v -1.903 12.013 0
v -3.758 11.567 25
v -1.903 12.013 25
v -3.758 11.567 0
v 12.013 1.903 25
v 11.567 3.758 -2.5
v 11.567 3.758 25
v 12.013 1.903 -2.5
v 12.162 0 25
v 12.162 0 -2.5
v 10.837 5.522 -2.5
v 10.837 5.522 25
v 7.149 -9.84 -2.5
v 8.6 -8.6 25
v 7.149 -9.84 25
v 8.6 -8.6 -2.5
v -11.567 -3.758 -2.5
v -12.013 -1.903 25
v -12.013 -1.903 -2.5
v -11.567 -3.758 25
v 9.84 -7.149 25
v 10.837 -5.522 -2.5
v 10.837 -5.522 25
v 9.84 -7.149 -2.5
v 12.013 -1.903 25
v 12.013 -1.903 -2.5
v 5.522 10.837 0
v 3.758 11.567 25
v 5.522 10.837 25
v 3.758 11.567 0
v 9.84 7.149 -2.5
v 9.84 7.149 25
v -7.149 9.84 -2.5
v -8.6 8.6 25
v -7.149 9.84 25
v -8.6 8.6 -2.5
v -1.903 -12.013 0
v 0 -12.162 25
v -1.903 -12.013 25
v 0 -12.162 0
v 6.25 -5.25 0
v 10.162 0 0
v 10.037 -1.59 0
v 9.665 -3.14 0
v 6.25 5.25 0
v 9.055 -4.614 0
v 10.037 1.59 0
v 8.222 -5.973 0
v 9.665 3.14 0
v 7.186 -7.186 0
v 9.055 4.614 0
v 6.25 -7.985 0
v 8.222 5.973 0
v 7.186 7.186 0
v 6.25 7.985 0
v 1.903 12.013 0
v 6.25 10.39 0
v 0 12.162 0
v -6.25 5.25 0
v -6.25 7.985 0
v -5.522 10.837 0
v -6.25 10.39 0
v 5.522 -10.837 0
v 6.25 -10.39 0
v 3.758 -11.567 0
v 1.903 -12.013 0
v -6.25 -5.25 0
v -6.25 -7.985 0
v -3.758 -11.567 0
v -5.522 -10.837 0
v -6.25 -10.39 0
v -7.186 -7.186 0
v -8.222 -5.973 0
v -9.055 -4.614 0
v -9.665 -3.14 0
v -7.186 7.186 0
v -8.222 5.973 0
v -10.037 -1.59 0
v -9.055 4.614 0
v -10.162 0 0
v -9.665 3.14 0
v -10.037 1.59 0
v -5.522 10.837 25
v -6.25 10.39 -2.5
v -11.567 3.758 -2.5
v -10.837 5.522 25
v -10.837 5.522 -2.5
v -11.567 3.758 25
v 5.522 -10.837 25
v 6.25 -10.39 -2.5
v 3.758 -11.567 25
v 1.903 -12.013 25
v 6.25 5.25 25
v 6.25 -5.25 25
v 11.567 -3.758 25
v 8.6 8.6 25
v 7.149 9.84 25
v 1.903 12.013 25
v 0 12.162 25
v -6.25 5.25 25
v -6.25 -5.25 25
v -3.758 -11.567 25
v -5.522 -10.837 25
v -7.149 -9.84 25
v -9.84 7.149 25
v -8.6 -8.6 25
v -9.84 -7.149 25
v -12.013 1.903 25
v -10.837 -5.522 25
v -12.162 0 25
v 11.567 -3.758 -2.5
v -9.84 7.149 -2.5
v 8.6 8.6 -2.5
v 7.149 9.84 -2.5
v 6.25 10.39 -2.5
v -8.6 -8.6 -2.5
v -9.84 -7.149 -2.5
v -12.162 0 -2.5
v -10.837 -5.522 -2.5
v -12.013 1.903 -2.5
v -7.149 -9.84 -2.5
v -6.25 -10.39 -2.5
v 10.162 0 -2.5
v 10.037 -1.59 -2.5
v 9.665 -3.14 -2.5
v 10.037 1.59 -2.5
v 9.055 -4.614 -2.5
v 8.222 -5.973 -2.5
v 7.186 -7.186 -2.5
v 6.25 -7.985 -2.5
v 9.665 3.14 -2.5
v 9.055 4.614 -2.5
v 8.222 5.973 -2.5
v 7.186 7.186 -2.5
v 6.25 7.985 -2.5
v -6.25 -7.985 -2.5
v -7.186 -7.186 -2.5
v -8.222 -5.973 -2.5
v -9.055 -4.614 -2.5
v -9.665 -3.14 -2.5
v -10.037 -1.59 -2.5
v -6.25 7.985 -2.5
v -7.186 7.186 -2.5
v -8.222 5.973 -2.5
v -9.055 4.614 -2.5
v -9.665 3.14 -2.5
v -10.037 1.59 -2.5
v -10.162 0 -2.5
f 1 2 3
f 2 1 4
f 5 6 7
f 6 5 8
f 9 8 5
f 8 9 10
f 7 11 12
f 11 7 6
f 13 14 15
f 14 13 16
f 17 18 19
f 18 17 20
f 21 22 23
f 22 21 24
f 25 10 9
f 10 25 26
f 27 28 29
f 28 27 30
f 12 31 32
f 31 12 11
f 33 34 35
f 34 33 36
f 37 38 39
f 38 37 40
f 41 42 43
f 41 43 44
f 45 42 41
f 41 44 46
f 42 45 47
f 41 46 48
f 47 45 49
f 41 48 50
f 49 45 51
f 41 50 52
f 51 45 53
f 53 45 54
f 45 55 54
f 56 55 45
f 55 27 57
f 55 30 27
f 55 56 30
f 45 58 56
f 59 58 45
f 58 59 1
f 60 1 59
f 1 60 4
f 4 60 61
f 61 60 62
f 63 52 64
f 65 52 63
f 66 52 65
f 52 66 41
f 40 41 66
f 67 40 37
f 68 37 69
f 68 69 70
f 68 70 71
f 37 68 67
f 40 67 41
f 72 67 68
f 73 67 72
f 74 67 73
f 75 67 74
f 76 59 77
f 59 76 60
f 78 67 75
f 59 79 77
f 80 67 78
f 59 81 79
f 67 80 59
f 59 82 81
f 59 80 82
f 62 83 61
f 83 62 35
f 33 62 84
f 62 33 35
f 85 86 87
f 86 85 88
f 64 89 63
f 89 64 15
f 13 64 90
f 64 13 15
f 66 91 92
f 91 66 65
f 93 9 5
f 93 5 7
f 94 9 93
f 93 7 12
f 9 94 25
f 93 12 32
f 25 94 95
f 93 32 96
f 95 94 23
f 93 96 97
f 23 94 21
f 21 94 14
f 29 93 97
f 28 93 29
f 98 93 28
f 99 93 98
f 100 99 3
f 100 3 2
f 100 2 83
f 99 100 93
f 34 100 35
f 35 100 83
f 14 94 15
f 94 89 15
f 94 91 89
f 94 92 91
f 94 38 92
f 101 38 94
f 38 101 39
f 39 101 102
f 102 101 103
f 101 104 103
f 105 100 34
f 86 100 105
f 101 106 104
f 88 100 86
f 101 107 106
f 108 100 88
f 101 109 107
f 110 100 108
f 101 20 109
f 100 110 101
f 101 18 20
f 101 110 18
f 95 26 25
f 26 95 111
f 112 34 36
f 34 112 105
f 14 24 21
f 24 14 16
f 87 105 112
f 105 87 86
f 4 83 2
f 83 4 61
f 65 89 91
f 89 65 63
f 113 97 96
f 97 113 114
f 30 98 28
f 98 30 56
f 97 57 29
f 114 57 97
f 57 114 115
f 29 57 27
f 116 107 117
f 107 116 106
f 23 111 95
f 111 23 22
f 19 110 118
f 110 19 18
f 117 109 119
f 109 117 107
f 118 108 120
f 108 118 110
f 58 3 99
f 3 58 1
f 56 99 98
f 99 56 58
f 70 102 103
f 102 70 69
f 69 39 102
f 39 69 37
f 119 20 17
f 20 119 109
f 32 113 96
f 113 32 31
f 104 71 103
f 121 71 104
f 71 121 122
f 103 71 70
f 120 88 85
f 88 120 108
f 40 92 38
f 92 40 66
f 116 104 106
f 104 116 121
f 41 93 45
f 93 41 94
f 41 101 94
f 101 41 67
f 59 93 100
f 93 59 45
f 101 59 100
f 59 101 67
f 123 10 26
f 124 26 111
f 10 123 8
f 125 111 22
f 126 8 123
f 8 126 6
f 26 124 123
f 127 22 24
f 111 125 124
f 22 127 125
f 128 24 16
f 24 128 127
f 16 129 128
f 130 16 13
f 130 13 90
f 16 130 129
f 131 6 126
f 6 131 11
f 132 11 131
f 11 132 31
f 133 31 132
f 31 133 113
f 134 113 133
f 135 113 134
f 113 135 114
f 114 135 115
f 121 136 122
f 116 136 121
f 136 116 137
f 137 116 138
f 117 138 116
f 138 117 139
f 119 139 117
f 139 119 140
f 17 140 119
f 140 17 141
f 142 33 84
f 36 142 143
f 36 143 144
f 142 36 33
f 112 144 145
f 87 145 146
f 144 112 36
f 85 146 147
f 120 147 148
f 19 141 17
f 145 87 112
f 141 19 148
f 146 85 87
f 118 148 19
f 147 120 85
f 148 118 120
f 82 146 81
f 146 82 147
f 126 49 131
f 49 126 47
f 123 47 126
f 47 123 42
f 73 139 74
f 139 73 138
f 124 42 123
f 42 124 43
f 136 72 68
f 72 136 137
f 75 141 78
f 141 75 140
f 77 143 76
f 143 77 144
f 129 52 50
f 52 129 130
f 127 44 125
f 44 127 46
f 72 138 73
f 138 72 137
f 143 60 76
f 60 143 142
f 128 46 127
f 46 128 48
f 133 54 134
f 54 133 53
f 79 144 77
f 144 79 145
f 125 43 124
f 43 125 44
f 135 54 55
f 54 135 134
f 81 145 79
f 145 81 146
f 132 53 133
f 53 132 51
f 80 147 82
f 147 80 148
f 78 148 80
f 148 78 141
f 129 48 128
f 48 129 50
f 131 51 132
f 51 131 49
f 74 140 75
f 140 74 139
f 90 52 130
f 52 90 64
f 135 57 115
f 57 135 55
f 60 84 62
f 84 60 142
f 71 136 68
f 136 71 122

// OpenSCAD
// file: modules/motor.scad
/***************
 * Computation *
 ***************/



/***********
 * Modules *
 ***********/
module motor(axis_length=10) {
    /*
     * Computation
     */

    // distance of the flat part of the axis from the center
    flat_distance = sqrt(motor_axis_rad * motor_axis_rad - motor_axis_flat_w * motor_axis_flat_w / 4);


    /*
     * Rendering
     */

    // Axis
    difference() {
        cylinder(axis_length, r=motor_axis_rad);
        translate([flat_distance, -motor_axis_rad, -1]) cube([2 * motor_axis_rad, 2 * motor_axis_rad, axis_length + 2]);
    }
    cylinder(0.5, r=motor_axis_rad + 0.5);

    // Reduction box
    translate([-motor_width / 2, -motor_height / 2, -reduction_length]) {
        difference() {
            cube([motor_width, motor_height, reduction_length]);
            translate([-1, -1, 1]) cube([motor_width + 2, motor_height + 2, (reduction_length - 3) / 2]);
            translate([-1, -1, (reduction_length - 3) / 2 + 2]) cube([motor_width + 2, motor_height + 2, (reduction_length - 3) / 2]);
        }
        translate([1, 1, 1]) cylinder((reduction_length - 3) / 2, 1);
        translate([motor_width - 1, motor_height - 1, 1]) cylinder((reduction_length - 3) / 2, 1);
        translate([motor_width - 1, 1, (reduction_length - 3) / 2 + 2]) cylinder((reduction_length - 3) / 2, 1);
        translate([1, motor_height - 1, (reduction_length - 3) / 2 + 2]) cylinder((reduction_length - 3) / 2, 1);
    }

    // motor
    translate([0, 0, -reduction_length - motor_length]) {
        intersection() {
            cylinder(motor_length, r=motor_width / 2);
            cube([motor_width, motor_height, 2 * motor_length], center=true);
        }
    }
}
// file: modules/motor_case.scad
include<motor.scad>

/***********
 * Modules *
 ***********/
module motor_case() {
    // radius for the case
    case_radius = sqrt(motor_height * motor_height + motor_width * motor_width) / 2 + 2 * thickness;

    // part for the motor
    difference() {
        cylinder(motor_length + reduction_length, r=case_radius);
        hull() {
            motor();
            translate([0, 0, motor_length + reduction_length]) motor();
        }
    }

    // male part for the tie
    tie_length = thickness + 0.5;
    translate([0, 0, -tie_length]) difference() {
        cylinder(tie_length, r=case_radius);
        translate([0, 0, -1]) cylinder(tie_length + 2, r=case_radius - thickness);
        translate([-motor_width / 2, -case_radius, -1]) cube([motor_width, 2 * case_radius, tie_length + 2]);
    }
}
// file: config.scad
/*****************
 * Configuration *
 *****************/
/*
 * Global
 */

// Resolution
$fn = 40;

// thickness of sides
thickness = 2;

/*
 * Spinner
 */

// radius for the spinner (inner and outer)
external_radius = 35 / 2;
internal_radius = 20 / 2;

// pitch - distance between coils (real opening)
pitch = 25;

// length of the spring part
spring_length = 100;
// length of the attach part
attach_length = 20;

// spring resolution - in degrees
step = 5;


/*
 * Spinner container
 */

// Size of the hole for food input/output
// It also define the size for the tube
opening_size = 40;

// Length for the spinner case
tube_length = (spring_length + attach_length + thickness) * 1.1;

// Additional tube height: height added after the input hole (to prevent
// the spinner being stuck)
spinner_case_add_height = 40;

// tie length
tie_length = 10;
tie_thickness = thickness / 2;


/*
 * Motor
 */

// radius of the motor axis
motor_axis_rad = 1.5;
// width of the flat part of the motor axis (type D)
motor_axis_flat_w = 2;

// height of the motor (distance between the 2 flat edges)
motor_height = 10.5;
// width of the motor (distance between the 2 curved edges)
motor_width = 12.5;

// length of the motor
motor_length = 15;

// length of the reduction gearbox
reduction_length = 10;


/*
 * Main case
 */

// dimensions
main_case_width = 140;
main_case_front_height = 150;
main_case_back_height = 230;
main_case_lower_depth = 100;
main_case_upper_depth = 20;

// height where the main case must be splitted (to ease printing)
main_case_split_height = 60;

// dimensions for the from foot (for stability)
foot_height = 20;
foot_length = 100;

// back door
back_door_thickness = thickness;
back_door_height = main_case_back_height + 20;

// floor plates
floor_thickness = thickness;
floor_length = 90;

// supports for the arduino
arduino_support_height = 5;
arduino_support_radius = 6;
arduino_support_axis_height = 3;
arduino_support_axis_radius = 1.5;

// Height where to place the center of the spinner
spinner_height = 120;

// dimensions of the push button
button_radius = 3.5;
button_width = 11.5;
button_groove = thickness - 0.5;

// dimensions of the LED
led_radius = 2;
led_feet_width = 1;
led_groove = thickness / 2;

// distance between push button & led
control_panel_interval = 20;


/*
 * Food container
 */

// dimensions
food_container_width = main_case_width;
food_container_depth = food_container_width;
food_container_slope_height = 100;
food_container_extension_height = 100;

/*
 * Pin
 */
pin_radius = 1;
// main file
include<config.scad>;
include<modules/motor_case.scad>;
include<modules/motor.scad>;


/*************
 * 3D Models *
 *************/
motor_case();

%rotate([180, 0, 0])  motor();
